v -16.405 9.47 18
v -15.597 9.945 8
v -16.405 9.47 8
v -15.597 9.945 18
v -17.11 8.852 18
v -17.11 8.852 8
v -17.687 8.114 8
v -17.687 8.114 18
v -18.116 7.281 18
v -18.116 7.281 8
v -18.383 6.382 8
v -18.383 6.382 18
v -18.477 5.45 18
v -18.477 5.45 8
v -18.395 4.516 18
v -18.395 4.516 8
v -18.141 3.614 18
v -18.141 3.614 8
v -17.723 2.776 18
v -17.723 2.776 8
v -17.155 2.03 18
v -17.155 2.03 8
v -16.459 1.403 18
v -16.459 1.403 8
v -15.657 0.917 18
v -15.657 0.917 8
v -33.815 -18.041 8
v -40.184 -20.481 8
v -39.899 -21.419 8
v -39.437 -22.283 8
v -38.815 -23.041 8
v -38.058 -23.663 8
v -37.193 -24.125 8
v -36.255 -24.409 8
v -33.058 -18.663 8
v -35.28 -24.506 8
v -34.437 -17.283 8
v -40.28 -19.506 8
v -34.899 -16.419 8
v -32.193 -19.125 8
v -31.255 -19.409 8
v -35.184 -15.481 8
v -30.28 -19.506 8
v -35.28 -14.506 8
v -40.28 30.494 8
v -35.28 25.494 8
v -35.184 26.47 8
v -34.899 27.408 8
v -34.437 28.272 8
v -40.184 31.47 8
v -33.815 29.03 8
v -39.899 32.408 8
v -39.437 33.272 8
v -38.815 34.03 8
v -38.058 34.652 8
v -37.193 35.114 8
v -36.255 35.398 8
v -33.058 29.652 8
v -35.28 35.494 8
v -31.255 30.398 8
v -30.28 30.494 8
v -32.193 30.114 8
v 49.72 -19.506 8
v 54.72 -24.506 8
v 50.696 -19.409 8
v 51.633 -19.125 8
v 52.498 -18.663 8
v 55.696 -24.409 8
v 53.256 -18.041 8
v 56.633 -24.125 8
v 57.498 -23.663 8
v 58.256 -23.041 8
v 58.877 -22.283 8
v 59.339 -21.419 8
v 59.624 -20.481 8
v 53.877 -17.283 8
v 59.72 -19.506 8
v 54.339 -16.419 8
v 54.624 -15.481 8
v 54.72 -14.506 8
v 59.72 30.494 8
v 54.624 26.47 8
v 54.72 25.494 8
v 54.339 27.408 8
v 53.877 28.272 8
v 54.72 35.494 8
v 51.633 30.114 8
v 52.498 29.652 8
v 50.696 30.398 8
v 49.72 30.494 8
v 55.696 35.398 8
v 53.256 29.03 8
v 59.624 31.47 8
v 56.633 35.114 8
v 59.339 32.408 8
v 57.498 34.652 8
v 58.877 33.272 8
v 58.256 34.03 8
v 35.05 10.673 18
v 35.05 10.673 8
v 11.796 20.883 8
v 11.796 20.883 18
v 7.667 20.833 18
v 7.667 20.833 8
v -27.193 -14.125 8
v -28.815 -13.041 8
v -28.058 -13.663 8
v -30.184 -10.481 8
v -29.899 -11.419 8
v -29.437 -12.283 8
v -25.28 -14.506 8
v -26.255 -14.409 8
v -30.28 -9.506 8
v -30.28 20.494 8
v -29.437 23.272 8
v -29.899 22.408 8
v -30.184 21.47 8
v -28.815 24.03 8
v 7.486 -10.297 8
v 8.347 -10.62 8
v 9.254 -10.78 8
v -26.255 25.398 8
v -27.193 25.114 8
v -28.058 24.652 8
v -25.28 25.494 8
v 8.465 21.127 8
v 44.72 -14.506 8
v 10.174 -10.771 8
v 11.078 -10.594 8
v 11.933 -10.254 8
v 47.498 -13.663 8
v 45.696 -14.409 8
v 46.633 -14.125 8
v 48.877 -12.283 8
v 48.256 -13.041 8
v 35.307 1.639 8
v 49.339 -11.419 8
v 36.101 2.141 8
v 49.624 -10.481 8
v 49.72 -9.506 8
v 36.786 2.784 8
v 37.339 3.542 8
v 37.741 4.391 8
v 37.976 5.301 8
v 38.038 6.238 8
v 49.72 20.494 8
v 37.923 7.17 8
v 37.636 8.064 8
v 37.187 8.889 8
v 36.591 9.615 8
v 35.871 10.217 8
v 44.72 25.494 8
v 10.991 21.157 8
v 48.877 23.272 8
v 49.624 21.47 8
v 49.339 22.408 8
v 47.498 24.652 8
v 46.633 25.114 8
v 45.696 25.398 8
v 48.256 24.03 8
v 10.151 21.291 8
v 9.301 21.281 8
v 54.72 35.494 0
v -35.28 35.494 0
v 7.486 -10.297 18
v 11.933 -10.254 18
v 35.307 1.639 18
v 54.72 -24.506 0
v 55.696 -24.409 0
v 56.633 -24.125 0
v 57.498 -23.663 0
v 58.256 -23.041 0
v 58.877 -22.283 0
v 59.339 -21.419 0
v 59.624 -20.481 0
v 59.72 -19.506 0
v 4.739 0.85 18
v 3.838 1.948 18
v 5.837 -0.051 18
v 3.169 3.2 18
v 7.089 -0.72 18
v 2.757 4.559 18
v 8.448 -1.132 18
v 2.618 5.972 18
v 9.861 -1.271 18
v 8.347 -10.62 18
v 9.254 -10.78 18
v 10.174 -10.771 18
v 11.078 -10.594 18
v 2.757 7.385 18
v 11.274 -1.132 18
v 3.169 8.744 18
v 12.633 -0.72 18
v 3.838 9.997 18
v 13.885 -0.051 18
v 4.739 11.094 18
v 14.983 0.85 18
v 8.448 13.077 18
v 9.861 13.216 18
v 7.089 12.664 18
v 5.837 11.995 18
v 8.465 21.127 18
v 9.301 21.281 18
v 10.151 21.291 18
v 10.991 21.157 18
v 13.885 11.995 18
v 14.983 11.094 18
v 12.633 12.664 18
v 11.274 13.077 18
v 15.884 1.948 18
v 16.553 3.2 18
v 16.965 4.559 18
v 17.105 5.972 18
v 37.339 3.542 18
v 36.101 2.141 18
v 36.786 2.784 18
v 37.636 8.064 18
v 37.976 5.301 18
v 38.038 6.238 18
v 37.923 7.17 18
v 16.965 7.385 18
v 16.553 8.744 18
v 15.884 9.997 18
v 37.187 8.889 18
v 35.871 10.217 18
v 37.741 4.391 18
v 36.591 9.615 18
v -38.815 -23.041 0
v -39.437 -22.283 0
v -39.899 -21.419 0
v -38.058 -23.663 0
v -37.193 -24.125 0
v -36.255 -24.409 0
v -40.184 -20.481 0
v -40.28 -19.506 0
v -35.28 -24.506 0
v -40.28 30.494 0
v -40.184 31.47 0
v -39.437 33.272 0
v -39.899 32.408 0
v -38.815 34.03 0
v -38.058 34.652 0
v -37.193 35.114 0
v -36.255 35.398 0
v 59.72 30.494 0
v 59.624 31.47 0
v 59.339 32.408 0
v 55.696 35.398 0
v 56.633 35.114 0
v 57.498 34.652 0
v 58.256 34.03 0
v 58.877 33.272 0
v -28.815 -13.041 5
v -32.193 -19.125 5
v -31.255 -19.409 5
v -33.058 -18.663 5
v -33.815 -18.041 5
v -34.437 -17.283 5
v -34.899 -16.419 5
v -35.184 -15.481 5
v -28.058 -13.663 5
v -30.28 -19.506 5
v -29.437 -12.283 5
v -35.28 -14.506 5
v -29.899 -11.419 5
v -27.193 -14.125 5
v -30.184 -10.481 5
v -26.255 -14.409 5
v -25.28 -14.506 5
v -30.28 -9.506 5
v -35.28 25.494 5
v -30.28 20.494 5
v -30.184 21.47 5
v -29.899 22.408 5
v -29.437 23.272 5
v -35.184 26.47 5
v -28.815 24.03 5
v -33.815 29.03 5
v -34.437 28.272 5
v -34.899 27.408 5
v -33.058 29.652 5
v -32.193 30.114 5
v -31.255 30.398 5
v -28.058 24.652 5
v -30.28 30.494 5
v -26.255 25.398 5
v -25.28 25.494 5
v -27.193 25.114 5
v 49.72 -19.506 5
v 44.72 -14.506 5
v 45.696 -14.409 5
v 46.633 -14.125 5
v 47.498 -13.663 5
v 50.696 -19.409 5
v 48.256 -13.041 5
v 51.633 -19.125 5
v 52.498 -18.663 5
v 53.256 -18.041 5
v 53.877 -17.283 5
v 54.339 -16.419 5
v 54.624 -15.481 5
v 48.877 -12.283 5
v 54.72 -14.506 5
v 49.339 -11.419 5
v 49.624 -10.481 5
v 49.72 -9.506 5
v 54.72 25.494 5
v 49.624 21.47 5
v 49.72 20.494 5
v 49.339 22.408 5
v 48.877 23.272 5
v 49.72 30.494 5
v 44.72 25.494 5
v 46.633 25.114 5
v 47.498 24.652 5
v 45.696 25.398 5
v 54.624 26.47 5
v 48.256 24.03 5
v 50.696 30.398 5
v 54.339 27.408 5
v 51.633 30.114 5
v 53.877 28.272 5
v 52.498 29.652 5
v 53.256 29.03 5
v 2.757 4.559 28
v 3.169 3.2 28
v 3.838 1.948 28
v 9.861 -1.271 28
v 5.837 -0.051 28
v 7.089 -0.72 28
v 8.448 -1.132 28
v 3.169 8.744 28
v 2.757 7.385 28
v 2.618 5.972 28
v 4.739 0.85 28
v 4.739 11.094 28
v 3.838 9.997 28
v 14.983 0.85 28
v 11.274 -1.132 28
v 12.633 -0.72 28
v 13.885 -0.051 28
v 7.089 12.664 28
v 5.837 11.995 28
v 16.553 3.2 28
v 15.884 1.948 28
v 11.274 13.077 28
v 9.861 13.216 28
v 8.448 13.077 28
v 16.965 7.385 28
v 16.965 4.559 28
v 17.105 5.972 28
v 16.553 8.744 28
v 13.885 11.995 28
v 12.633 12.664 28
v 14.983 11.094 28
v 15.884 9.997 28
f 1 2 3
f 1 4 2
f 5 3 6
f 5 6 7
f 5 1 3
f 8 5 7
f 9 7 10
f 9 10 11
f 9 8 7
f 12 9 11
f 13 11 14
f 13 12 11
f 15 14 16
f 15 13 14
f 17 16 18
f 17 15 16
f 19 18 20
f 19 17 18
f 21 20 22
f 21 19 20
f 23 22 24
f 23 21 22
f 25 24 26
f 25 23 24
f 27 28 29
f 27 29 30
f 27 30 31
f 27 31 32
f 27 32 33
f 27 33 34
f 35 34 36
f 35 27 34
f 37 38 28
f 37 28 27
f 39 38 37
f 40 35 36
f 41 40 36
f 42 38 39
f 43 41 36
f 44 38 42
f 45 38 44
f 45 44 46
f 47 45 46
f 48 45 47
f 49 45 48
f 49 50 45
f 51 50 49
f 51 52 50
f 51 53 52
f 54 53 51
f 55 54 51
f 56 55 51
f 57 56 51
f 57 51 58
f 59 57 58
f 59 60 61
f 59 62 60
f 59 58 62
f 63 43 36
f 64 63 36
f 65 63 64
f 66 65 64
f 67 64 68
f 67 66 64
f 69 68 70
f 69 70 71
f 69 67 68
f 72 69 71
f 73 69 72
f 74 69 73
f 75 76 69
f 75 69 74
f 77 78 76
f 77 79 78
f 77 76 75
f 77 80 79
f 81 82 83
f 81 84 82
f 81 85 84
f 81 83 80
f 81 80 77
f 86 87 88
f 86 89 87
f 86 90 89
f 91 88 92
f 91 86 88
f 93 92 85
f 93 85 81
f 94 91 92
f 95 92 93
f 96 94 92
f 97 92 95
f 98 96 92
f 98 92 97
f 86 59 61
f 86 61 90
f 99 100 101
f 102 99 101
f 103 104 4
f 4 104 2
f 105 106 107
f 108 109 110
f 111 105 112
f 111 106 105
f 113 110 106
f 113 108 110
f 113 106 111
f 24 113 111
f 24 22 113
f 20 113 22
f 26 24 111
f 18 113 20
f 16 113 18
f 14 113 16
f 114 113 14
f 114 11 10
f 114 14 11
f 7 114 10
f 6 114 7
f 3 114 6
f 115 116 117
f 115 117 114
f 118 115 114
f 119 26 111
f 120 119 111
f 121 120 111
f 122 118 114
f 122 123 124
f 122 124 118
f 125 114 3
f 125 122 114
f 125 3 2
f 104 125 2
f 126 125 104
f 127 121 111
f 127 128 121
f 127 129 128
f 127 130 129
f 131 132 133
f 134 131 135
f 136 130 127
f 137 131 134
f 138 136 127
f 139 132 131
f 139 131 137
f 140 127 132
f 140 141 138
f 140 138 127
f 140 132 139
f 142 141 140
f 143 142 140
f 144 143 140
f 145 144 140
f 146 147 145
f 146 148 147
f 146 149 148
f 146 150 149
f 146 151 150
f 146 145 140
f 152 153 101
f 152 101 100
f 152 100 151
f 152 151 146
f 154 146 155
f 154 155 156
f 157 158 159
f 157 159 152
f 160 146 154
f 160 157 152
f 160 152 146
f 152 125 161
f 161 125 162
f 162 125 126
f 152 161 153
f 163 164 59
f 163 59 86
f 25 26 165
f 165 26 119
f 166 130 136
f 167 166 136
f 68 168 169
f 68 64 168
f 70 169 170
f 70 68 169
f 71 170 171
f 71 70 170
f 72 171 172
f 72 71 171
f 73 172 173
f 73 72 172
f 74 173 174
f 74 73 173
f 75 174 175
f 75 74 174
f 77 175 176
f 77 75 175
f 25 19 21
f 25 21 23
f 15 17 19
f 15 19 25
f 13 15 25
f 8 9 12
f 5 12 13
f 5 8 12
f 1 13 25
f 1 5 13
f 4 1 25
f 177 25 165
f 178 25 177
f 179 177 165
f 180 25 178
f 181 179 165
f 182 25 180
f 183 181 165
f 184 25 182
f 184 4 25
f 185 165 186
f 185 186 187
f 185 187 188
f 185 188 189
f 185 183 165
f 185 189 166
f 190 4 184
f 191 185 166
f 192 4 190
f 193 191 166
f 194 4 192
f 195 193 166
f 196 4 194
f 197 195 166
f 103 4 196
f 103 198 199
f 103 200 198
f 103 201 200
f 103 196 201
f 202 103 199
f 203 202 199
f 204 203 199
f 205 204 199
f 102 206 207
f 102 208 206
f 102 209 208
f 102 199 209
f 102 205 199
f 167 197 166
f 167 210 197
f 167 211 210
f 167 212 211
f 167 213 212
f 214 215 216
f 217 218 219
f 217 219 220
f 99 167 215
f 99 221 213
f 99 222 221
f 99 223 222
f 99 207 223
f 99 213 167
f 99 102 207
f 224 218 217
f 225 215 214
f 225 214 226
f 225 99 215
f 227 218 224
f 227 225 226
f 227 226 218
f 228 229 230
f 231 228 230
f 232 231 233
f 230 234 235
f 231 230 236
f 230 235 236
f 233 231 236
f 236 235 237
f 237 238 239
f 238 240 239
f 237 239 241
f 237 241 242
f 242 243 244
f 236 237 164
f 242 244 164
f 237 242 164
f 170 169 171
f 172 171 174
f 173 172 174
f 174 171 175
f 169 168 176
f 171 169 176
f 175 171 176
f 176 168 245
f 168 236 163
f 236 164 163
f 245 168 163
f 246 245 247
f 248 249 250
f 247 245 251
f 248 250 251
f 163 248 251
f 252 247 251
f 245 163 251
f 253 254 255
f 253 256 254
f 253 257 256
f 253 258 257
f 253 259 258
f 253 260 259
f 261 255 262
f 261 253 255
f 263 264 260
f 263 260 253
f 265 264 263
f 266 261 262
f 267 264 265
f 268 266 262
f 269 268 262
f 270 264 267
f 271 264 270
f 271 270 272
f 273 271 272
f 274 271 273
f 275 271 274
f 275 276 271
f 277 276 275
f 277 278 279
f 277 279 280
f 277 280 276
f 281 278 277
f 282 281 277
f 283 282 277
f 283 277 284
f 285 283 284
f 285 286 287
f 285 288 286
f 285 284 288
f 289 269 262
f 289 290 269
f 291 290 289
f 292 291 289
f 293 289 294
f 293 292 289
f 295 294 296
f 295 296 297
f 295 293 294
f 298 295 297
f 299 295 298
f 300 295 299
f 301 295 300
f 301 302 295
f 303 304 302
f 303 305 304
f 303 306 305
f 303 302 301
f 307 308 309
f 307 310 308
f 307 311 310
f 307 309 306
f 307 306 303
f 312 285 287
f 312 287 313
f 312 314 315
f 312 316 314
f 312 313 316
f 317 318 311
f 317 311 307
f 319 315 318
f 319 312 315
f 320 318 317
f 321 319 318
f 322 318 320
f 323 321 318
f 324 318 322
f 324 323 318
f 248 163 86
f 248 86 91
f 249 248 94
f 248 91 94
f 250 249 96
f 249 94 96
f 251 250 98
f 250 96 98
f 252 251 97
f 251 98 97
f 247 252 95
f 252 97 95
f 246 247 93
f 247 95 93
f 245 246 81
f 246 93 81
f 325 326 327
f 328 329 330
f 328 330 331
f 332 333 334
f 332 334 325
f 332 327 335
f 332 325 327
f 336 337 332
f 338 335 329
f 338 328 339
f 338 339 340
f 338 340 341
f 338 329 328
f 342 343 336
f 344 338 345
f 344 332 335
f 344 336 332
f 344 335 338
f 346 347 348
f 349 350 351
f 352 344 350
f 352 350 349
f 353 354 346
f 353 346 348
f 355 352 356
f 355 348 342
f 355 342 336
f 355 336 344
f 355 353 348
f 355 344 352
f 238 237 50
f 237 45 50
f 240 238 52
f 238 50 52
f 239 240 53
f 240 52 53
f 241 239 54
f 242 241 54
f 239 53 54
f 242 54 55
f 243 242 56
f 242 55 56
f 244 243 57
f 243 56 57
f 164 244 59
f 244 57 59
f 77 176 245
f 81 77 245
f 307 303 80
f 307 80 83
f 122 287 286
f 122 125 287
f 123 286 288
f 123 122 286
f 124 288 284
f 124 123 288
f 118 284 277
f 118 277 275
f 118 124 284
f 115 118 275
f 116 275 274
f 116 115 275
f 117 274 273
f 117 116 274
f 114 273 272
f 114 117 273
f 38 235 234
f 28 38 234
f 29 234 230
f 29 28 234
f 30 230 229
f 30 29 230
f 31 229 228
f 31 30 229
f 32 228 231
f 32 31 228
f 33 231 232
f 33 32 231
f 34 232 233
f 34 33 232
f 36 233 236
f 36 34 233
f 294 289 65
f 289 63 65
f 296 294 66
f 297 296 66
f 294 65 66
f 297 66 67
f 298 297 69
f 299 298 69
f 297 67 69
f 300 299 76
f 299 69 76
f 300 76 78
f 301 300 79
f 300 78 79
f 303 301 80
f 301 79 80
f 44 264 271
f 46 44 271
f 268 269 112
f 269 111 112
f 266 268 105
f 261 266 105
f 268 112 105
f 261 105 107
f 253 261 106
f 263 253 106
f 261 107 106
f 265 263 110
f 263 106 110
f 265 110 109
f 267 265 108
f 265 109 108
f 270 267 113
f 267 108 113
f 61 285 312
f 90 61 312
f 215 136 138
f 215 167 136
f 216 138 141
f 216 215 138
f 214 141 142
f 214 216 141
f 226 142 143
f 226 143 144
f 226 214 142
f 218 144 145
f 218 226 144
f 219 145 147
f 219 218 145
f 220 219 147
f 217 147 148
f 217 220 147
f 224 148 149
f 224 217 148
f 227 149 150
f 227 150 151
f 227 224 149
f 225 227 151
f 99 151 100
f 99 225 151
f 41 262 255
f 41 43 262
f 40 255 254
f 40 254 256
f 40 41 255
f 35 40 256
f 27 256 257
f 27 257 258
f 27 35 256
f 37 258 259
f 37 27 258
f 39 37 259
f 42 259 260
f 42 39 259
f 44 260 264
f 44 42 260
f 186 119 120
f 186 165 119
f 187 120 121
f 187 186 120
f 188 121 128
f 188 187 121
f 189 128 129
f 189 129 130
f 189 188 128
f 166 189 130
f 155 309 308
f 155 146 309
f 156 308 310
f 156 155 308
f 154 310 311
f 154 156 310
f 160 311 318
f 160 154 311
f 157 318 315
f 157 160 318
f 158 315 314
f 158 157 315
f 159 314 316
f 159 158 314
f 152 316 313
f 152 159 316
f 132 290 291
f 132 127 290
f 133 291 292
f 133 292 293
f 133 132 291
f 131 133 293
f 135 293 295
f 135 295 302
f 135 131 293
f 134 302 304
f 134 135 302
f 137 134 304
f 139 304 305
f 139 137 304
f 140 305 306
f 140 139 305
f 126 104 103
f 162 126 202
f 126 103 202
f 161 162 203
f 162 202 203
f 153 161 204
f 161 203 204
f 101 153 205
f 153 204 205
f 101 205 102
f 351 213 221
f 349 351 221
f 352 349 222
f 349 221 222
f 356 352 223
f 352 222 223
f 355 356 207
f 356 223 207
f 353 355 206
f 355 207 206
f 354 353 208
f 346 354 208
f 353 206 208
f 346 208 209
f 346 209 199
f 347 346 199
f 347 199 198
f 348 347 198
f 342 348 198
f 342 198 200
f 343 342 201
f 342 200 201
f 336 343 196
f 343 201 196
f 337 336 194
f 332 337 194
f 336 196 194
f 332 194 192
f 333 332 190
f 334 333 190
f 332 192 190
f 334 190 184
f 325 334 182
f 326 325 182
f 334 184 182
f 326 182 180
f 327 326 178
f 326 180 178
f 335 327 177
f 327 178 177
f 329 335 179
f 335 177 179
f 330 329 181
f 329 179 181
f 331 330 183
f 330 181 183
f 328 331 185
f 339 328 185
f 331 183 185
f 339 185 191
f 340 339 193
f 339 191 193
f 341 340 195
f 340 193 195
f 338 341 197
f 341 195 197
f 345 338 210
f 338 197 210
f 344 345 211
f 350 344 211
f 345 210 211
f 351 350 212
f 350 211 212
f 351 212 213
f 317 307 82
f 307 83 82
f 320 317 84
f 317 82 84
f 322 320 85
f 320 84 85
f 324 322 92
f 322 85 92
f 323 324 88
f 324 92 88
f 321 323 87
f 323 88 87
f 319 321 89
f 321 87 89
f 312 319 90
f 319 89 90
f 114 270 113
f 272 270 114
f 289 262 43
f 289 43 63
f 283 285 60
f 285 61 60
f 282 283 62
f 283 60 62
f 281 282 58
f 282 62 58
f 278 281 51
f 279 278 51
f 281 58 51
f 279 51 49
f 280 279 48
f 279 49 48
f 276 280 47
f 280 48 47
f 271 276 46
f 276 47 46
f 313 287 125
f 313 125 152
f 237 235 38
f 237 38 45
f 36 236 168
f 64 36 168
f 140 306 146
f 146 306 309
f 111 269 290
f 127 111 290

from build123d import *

# Parameters (mm, degrees)
F0_W     = 100
F0_H     = 60
F0_W_2   = 90
F0_H_2   = 50
F0_W_3   = 80
F0_H_3   = 40
F1_DEPTH = 8
F2_DEPTH = 5
F4_DEPTH = 10
F5_R     = 5
F6_R     = 7.243557
F7_DEPTH = 10
F8_R     = 5


with BuildPart() as f1:
    # F0 (on Top) → F1 (new body)
    with BuildSketch(Plane.XY):
        with Locations((9.720059, 5.494498)):
            Rectangle(F0_W, F0_H)
        with Locations((9.720059, 5.494498)):
            Rectangle(F0_W_2, F0_H_2, mode=Mode.SUBTRACT)
        with Locations((9.720059, 5.494498)):
            Rectangle(F0_W_3, F0_H_3)
    extrude(amount=F1_DEPTH)

    # F0 (on Top) → F2 (join)
    with BuildSketch(Plane.XY):
        with Locations((9.720059, 5.494498)):
            Rectangle(F0_W_2, F0_H_2)
        with Locations((9.720059, 5.494498)):
            Rectangle(F0_W_3, F0_H_3, mode=Mode.SUBTRACT)
    extrude(amount=F2_DEPTH)

    # F3 (on face) → F4 (join)
    with BuildSketch(Plane.XY.offset(8)):
        Polygon((9.720059, 21.794148), (-25.105188, 5.494498), (9.720059, -11.379591), (44.720059, 6.427957), align=None)
    extrude(amount=F4_DEPTH)

    # F5
    f5_edges = [f1.edges().sort_by_distance(p)[0] for p in [
        (54.720059, -19.505502, 6.5),
        (-35.279941, -19.505502, 6.5),
        (-35.279941, 30.494498, 6.5),
        (54.720059, 30.494498, 6.5),
        (-30.279941, 25.494498, 6.5),
        (-30.279941, -14.505502, 6.5),
        (49.720059, -14.505502, 6.5),
        (49.720059, 25.494498, 6.5),
        (44.720059, 6.427957, 13),
        (9.720059, 21.794148, 13),
        (9.720059, -11.379591, 13),
        (-25.105188, 5.494498, 13),
    ]]
    fillet(f5_edges, radius=F5_R)

    # F6 (on face) → F7 (join)
    with BuildSketch(Plane.XY.offset(18)):
        with Locations((9.861113, 5.972222)):
            Circle(F6_R)
    extrude(amount=F7_DEPTH)

    # F8
    f8_edges = [f1.edges().sort_by_distance(p)[0] for p in [
        (59.720059, -24.505502, 4),
        (-40.279941, -24.505502, 4),
        (-40.279941, 35.494498, 4),
        (59.720059, 35.494498, 4),
    ]]
    fillet(f8_edges, radius=F8_R)


solid = f1.part
